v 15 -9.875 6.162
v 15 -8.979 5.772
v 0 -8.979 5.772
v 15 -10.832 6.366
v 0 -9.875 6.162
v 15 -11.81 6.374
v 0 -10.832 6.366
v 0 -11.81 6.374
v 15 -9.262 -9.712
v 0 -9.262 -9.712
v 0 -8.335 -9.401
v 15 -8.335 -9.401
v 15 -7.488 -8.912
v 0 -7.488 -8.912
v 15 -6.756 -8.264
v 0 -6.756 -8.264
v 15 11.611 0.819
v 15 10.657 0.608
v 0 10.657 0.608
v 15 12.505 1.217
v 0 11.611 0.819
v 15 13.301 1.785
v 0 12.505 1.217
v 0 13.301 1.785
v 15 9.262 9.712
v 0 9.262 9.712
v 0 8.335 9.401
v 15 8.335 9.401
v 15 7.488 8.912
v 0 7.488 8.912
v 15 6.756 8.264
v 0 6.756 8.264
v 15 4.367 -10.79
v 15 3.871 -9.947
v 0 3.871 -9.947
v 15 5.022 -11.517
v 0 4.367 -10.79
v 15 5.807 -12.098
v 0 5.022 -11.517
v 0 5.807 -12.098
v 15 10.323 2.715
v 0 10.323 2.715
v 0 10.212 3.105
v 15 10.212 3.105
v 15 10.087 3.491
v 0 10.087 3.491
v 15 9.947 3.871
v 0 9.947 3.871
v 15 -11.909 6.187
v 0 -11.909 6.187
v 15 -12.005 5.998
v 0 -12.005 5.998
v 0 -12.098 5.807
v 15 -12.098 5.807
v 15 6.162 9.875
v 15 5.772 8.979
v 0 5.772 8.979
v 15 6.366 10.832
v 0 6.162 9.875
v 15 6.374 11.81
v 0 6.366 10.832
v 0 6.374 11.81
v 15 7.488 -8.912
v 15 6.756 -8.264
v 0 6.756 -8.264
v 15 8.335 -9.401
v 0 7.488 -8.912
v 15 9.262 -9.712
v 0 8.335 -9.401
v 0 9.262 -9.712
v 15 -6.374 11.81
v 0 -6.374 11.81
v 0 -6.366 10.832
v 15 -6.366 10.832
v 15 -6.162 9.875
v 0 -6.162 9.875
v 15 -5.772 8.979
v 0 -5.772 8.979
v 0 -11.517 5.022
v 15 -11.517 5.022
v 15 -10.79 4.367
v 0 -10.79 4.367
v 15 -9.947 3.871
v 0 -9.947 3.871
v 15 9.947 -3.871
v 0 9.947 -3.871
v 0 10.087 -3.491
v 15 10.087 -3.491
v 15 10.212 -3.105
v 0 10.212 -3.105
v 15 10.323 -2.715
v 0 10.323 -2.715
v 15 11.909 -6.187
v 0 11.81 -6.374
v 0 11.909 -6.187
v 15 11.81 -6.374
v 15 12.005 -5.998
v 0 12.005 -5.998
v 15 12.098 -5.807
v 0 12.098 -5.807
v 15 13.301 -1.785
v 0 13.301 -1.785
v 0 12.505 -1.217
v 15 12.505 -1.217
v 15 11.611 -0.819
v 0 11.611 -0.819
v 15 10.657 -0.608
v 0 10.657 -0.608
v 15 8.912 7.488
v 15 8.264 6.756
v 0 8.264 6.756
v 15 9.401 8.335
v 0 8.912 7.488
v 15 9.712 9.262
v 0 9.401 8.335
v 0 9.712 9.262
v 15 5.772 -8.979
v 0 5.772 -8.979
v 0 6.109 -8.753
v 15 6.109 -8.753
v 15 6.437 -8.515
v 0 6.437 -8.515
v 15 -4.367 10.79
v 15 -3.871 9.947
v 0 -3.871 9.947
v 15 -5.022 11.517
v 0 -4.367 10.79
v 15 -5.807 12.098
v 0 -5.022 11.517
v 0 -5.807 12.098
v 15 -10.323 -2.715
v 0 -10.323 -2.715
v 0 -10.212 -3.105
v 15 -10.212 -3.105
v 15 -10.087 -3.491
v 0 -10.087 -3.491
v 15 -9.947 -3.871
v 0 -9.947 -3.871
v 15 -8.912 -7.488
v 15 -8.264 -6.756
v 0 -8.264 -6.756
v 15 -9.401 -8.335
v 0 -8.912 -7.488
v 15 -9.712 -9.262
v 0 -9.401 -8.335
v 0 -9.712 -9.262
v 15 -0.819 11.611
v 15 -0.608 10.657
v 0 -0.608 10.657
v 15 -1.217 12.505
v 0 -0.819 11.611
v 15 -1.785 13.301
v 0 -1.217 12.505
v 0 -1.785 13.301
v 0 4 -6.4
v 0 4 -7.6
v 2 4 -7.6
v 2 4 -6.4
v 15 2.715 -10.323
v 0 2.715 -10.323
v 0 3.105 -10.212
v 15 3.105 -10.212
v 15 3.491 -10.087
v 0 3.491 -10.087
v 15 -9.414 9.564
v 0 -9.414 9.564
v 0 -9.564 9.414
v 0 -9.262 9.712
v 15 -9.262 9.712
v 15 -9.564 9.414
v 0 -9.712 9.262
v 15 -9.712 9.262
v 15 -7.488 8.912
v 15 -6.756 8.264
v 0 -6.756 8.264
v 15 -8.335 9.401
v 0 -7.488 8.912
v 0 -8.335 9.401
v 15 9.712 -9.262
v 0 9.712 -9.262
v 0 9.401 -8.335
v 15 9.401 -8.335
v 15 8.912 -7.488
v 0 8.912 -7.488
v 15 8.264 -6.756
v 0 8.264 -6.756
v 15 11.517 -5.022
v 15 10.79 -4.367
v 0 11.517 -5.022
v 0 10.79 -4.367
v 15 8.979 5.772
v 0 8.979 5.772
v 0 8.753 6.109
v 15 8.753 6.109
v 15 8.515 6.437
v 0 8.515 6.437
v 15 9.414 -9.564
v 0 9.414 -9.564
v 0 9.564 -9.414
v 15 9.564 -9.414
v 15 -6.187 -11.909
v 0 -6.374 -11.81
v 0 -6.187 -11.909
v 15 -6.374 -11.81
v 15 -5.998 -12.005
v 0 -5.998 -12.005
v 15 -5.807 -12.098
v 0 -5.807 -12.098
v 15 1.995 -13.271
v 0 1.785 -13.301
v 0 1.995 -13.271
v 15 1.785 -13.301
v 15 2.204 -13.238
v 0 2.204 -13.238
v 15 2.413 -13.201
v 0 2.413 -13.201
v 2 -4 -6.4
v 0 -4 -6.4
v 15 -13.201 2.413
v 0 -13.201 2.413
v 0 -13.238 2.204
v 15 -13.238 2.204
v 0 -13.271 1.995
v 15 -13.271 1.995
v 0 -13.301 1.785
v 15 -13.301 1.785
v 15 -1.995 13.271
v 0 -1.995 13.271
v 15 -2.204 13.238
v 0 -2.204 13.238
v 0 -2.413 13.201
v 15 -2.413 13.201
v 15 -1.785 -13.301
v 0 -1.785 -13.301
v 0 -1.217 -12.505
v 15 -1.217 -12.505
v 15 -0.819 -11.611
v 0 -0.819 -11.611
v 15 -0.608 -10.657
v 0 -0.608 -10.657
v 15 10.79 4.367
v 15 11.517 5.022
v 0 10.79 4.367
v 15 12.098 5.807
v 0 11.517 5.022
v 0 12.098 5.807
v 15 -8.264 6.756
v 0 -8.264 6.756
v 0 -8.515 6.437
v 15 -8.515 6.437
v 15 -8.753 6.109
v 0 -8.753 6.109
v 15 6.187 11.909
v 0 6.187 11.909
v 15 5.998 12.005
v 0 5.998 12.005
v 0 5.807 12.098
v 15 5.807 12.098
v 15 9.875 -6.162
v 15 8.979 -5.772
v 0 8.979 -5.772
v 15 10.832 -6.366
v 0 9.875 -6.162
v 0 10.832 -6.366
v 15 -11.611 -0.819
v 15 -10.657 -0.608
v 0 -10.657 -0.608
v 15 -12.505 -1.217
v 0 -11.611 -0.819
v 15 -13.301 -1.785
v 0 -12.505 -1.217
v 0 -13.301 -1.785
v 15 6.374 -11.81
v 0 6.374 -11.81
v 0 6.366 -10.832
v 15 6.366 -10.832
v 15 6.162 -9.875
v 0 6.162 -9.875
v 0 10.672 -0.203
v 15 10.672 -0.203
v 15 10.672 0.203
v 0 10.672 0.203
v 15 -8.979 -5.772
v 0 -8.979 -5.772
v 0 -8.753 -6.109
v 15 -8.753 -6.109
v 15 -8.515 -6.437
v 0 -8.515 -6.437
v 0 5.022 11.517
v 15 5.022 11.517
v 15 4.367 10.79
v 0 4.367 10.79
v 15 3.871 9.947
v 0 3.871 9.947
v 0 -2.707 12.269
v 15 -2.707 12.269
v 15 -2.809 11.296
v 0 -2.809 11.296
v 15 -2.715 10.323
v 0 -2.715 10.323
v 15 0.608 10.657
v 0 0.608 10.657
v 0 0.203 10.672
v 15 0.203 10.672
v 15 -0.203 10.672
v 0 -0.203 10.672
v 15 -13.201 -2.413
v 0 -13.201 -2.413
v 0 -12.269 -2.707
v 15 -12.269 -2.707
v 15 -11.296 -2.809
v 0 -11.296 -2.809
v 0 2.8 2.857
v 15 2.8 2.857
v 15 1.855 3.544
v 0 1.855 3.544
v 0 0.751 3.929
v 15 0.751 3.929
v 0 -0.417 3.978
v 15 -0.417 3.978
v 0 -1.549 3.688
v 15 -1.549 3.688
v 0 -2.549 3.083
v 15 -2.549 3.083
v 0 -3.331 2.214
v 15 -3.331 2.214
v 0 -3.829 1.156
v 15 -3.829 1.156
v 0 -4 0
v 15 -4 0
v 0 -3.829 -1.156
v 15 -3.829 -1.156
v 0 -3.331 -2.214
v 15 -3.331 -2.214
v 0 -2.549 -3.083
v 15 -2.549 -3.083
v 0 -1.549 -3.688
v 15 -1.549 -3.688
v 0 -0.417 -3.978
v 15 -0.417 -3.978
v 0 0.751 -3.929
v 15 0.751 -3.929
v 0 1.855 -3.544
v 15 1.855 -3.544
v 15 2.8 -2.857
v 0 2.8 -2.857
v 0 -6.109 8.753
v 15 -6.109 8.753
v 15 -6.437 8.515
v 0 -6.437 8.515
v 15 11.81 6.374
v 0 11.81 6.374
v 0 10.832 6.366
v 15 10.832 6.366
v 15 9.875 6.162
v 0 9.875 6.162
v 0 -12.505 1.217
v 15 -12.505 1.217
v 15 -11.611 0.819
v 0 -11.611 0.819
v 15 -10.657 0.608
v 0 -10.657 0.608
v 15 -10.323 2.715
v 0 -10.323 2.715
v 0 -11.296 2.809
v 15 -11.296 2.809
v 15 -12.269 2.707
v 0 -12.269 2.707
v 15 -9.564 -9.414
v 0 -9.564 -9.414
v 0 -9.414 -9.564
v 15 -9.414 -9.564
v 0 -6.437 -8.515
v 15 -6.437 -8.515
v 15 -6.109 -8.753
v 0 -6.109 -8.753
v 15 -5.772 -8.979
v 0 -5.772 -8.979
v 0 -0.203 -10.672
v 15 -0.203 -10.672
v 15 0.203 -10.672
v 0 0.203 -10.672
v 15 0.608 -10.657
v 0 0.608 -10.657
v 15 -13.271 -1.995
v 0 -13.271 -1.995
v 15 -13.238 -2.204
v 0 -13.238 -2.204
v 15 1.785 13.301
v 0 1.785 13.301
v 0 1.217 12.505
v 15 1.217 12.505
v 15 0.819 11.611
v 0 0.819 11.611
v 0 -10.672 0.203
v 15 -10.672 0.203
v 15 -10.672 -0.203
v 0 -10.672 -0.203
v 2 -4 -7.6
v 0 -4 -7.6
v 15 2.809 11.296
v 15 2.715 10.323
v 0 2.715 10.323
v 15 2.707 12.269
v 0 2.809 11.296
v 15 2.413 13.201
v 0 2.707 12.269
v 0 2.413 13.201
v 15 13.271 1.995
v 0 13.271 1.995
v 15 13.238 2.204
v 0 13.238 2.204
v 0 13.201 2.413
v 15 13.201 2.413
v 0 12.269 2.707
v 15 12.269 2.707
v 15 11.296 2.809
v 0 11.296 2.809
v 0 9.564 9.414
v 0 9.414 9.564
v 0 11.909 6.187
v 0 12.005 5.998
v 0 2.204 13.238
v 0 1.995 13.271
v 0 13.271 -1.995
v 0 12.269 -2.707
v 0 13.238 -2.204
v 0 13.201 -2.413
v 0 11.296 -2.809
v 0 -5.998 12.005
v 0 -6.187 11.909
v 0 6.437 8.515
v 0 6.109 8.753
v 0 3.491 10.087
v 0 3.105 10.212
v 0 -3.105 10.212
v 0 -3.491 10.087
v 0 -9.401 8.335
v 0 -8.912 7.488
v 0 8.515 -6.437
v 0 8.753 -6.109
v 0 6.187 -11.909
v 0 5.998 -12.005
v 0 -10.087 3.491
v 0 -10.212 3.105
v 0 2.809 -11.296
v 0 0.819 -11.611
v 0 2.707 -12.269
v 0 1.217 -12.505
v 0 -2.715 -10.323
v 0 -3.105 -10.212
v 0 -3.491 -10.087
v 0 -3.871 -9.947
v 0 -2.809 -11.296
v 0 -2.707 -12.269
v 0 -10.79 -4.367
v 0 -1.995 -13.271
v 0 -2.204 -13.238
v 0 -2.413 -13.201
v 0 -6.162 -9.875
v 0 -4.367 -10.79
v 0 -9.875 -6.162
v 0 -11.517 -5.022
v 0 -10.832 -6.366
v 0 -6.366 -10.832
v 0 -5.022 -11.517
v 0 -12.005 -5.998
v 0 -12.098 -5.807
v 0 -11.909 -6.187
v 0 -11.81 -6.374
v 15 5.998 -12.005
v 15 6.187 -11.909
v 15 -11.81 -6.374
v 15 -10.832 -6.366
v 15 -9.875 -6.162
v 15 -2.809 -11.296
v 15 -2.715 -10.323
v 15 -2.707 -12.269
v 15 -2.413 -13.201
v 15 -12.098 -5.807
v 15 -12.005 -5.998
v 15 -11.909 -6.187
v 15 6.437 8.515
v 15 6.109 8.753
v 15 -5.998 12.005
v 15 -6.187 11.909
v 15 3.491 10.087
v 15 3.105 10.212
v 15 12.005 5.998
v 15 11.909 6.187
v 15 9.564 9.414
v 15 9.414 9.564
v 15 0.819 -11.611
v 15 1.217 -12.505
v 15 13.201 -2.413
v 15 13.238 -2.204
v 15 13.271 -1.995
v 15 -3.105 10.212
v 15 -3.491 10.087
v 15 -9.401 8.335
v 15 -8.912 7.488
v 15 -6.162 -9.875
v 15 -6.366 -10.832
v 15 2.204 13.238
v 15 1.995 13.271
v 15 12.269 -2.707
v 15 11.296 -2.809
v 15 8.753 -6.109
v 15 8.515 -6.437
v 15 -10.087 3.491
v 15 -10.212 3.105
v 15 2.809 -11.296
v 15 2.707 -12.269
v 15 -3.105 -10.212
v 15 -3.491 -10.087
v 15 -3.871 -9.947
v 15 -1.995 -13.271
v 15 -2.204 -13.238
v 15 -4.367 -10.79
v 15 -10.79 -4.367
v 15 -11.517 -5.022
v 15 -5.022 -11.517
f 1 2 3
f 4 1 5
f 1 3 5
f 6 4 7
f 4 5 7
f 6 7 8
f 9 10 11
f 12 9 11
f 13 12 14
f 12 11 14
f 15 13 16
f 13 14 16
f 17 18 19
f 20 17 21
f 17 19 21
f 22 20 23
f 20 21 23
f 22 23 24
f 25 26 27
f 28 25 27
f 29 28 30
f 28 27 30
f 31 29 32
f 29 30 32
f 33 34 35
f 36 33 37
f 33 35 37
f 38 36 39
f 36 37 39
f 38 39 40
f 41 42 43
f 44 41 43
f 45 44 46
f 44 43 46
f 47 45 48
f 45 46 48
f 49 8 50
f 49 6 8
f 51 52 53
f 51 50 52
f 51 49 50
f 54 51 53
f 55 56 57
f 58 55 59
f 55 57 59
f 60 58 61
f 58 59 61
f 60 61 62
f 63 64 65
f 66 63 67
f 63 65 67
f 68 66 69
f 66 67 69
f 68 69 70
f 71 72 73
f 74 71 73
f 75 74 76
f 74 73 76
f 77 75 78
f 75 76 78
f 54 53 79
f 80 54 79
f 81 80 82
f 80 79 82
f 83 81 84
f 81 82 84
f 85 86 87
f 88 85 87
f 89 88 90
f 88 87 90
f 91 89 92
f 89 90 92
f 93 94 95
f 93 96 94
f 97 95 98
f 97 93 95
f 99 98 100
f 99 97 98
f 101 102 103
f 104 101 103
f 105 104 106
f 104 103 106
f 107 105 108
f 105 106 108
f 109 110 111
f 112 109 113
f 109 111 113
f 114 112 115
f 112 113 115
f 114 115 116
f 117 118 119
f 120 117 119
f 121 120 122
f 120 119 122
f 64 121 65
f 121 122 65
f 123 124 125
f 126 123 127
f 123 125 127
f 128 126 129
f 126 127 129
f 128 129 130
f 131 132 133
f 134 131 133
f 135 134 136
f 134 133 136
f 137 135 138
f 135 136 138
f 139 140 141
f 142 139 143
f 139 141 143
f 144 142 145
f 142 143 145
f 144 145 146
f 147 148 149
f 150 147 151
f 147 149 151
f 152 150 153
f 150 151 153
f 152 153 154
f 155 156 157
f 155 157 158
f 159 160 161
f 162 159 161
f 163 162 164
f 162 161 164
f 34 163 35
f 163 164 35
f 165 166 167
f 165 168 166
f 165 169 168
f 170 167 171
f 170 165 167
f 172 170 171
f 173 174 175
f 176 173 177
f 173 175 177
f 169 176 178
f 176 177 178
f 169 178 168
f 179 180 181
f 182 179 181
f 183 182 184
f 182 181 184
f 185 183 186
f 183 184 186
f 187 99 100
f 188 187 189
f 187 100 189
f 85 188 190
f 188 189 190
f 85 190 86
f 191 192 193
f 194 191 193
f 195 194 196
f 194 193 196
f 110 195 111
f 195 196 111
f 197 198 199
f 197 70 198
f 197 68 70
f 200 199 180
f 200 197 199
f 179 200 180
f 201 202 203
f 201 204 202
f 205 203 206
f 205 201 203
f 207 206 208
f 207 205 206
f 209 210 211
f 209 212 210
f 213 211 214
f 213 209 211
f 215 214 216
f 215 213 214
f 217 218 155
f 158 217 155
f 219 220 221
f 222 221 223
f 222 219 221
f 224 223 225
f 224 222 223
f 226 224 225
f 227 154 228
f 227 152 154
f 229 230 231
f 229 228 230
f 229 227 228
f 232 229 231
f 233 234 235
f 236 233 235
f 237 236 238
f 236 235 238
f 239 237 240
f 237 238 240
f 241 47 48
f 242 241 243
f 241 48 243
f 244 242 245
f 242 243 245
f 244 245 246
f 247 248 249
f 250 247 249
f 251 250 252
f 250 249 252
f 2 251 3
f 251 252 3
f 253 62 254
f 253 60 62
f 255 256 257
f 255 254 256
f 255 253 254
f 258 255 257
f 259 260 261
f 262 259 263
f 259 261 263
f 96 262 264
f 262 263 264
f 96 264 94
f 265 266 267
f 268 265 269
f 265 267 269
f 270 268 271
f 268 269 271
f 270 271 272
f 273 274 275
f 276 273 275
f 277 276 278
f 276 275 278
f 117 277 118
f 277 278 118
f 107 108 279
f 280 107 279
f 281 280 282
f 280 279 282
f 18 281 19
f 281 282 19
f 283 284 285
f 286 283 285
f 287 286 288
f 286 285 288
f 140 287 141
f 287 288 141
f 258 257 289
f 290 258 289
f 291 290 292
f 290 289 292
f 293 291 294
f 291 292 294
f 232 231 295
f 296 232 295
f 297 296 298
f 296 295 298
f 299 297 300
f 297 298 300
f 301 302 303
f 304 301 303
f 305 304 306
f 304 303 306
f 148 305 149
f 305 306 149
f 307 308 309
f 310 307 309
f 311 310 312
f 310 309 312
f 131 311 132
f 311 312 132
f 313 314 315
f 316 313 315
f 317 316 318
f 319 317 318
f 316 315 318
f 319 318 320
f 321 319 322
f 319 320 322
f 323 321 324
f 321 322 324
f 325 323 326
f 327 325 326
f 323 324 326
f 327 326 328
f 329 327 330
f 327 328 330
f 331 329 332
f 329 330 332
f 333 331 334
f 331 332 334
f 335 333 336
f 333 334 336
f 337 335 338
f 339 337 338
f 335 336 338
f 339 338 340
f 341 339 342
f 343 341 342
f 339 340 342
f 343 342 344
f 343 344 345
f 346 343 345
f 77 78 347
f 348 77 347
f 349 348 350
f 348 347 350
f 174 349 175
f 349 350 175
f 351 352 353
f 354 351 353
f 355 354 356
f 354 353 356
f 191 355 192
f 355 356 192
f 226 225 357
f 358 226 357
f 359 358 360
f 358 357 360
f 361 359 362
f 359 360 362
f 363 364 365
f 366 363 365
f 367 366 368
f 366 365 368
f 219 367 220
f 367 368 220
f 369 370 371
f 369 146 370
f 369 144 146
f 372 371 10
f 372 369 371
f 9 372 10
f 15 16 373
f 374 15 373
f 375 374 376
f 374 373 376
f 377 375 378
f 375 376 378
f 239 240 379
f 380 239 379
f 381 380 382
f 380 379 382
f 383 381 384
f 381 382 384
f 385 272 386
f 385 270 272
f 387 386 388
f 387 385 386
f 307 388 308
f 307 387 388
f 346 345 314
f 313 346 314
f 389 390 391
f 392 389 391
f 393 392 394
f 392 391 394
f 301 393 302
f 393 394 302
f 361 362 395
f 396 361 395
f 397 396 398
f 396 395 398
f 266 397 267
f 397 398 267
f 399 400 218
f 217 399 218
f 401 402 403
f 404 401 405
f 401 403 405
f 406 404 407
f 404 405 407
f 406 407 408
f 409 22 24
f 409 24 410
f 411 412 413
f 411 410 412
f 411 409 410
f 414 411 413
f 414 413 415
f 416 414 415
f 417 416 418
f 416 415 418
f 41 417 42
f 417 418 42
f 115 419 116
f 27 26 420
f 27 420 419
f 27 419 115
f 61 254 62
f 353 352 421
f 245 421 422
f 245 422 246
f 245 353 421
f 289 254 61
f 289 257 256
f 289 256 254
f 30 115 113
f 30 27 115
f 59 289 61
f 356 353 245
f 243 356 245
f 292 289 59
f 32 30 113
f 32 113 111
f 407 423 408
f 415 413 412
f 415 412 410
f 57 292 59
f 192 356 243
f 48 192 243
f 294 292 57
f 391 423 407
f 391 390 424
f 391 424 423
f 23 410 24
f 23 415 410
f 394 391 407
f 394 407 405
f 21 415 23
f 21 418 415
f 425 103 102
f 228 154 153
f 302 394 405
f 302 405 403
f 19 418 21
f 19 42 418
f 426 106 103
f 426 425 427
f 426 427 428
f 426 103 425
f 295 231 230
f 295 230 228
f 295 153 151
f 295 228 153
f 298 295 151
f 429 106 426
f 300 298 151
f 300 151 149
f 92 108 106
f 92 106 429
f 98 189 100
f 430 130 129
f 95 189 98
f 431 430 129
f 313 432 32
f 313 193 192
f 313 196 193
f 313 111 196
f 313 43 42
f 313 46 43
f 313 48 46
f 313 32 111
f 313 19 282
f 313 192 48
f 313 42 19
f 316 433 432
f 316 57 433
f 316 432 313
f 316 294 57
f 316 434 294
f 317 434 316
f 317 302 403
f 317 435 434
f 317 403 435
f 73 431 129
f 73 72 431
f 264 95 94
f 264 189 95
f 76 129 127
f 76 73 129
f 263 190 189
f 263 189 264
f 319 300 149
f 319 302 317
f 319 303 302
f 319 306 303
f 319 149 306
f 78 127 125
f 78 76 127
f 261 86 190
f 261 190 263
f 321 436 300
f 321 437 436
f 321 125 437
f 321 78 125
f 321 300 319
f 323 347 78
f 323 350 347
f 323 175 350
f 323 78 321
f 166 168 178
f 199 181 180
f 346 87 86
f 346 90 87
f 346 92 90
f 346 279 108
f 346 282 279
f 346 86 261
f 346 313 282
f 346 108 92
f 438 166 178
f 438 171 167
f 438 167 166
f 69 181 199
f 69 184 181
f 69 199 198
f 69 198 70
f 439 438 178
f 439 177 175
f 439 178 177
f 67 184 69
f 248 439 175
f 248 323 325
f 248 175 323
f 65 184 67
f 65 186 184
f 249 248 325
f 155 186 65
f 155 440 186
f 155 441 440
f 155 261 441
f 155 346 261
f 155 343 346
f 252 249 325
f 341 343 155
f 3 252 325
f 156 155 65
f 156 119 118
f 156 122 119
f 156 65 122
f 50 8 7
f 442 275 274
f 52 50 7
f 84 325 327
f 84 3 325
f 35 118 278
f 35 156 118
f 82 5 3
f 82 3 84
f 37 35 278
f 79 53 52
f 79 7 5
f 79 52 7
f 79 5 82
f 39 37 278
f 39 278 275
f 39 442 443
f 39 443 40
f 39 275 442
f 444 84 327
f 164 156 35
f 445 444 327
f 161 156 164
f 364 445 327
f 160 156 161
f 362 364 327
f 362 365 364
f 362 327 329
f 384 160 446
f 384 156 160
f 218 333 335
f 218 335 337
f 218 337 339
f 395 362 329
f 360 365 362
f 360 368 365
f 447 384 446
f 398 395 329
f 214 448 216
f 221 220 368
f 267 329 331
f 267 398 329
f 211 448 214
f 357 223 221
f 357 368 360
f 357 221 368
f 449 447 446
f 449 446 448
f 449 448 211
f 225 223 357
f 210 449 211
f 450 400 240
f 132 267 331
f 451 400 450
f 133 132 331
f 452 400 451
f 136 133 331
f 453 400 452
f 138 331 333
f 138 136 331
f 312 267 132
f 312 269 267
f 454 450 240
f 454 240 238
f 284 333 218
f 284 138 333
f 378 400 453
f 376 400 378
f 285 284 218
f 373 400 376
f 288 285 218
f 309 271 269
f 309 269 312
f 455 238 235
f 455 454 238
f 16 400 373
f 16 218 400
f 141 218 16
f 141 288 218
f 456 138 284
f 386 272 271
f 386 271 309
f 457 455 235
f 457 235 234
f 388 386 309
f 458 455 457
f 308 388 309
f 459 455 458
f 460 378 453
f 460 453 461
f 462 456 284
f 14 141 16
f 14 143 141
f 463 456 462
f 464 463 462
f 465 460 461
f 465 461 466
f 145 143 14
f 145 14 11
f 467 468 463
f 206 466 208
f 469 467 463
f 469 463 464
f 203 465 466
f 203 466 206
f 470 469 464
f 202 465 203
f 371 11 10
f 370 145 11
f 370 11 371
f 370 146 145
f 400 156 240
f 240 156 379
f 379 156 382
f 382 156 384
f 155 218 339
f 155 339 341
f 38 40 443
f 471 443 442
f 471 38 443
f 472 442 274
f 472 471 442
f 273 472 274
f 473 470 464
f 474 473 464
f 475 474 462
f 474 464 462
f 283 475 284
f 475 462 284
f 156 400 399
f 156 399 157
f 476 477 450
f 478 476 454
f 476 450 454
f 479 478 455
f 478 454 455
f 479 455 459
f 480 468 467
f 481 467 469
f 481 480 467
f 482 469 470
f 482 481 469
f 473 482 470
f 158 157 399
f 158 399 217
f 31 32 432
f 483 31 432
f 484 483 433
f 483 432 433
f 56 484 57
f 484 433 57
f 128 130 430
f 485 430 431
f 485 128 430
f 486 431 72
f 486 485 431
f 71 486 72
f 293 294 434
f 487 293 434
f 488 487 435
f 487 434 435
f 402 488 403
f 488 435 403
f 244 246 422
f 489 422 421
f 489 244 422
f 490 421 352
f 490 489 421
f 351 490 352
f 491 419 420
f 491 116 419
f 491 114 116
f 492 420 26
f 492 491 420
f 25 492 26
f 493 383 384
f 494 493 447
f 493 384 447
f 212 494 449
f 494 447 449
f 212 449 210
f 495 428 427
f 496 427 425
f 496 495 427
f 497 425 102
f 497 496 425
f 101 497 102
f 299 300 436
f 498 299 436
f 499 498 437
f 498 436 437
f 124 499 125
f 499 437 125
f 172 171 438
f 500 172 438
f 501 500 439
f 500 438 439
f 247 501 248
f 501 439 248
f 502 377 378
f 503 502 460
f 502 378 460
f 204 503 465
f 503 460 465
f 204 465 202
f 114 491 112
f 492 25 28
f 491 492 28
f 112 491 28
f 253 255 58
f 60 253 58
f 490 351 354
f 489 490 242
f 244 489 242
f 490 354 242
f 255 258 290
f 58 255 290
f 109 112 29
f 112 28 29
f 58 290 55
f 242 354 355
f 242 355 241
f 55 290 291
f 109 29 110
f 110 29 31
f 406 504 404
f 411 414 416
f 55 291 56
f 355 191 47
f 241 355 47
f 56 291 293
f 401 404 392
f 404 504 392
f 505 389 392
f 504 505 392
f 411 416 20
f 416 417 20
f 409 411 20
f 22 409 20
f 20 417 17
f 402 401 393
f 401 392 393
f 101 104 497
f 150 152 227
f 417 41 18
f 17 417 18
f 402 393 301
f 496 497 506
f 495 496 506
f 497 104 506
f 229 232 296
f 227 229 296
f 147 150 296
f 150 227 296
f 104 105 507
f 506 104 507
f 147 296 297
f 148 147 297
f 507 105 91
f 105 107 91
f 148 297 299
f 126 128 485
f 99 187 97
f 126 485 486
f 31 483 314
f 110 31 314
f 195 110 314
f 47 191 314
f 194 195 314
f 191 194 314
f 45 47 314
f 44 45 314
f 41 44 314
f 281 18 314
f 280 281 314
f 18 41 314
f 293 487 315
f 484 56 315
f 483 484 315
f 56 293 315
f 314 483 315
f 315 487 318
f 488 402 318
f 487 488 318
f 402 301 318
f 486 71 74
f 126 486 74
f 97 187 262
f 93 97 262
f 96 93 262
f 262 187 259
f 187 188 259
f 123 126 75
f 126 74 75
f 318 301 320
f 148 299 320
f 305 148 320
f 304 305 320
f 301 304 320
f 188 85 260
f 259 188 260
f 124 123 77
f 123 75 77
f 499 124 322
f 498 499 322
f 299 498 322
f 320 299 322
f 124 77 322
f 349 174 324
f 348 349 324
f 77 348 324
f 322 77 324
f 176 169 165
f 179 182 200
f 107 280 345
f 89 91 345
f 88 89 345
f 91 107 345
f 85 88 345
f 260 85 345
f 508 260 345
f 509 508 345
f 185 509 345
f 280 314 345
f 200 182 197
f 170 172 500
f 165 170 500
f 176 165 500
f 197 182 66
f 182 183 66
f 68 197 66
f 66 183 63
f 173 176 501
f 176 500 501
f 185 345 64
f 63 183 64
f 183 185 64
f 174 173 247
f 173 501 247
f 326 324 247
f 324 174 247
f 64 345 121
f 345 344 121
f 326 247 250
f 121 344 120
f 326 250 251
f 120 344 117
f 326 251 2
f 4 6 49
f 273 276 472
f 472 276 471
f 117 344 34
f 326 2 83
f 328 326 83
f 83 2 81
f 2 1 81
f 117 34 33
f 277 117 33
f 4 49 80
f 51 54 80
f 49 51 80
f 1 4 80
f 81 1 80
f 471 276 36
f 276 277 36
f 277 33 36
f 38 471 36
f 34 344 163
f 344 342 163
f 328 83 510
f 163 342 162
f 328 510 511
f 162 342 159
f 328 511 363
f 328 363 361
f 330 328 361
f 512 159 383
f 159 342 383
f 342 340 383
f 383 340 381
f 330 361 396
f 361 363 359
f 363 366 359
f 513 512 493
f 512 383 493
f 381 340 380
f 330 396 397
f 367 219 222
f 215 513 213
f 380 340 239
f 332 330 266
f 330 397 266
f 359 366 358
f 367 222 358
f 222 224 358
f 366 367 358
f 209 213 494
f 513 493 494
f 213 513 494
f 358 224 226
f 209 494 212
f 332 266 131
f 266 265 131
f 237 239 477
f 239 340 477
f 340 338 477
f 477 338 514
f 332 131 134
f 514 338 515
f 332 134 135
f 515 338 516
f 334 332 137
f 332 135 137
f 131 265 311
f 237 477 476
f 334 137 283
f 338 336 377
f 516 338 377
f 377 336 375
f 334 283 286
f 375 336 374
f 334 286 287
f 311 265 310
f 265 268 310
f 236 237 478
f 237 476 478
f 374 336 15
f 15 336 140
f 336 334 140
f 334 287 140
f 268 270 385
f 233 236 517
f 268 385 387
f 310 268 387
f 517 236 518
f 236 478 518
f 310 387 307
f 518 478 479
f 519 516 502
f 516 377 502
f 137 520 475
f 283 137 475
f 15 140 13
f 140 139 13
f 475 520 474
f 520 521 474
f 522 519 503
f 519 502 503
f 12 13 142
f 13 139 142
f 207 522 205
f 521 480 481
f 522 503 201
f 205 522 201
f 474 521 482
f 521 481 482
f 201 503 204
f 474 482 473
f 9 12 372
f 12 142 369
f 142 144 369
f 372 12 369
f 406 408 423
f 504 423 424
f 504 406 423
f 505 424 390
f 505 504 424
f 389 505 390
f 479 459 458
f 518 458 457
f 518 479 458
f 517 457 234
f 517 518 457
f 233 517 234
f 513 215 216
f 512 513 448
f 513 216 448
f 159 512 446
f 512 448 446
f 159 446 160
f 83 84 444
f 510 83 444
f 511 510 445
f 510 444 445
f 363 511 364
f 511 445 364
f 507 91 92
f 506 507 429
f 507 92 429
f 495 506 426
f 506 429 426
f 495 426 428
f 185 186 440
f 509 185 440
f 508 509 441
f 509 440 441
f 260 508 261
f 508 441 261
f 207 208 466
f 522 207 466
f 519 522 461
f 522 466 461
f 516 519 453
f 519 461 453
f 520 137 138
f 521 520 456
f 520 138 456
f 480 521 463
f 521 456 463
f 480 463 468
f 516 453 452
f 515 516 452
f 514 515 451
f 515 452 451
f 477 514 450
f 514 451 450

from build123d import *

# Parameters (mm, degrees)
BASPROSKE_W         = 15
BASPROSKE_H         = 13.42
TOOTHCUT_DEPTH      = 25.190758566
TEETHCUTS_COUNT     = 20
TEETHCUTS_ANGLE     = 342
BORSKE_R            = 4
BORE_DEPTH          = 50.0000508
BOSS_EXTRUDE1_START = -15
BOSS_EXTRUDE1_DEPTH = 15
SKETCH2_W           = 1.2
SKETCH2_H           = 8
CUT_EXTRUDE1_DEPTH  = 2


with BuildPart() as part:
    # BasProSke → Base-Revolve (revolve)
    with BuildSketch(Plane(origin=(0, 0, 0), x_dir=(1, 0, 0), z_dir=(0, 1, 0)), mode=Mode.PRIVATE) as base_revolve_sk:
        with Locations((7.5, 6.71)):
            Rectangle(BASPROSKE_W, BASPROSKE_H)
    revolve(base_revolve_sk.sketch.rotate(Axis((-10, 0, 0), (1, 0, 0)), 180), axis=Axis((-10, 0, 0), (1, 0, 0)))

    # TooCutSke → ToothCut (cut, through all)
    with BuildSketch(Plane(origin=(0, 0, 0), x_dir=(0, 0, -1), z_dir=(1, 0, 0))):
        with BuildLine():
            ThreePointArc((0.607848894, 10.656678456), (0, 10.674), (-0.607848894, 10.656678456))
            ThreePointArc((-0.607848894, 10.656678456), (-1.001950595, 12.081933102), (-1.804853959, 13.32371132))
            ThreePointArc((-1.804853959, 13.32371132), (0, 13.4454), (1.804853959, 13.32371132))
            ThreePointArc((1.804853959, 13.32371132), (1.001950595, 12.081933102), (0.607848894, 10.656678456))
        make_face()
    toothcut = extrude(amount=TOOTHCUT_DEPTH, mode=Mode.SUBTRACT)

    # TeethCuts: ToothCut ×20 about axis
    teethcuts_axis = Axis((-10, 0, 0), (1, 0, 0))
    for i in range(1, TEETHCUTS_COUNT):
        add(toothcut.rotate(teethcuts_axis, i * TEETHCUTS_ANGLE / (TEETHCUTS_COUNT - 1)), mode=Mode.SUBTRACT)

    # BorSke → Bore (cut, symmetric)
    with BuildSketch(Plane(origin=(0, 0, 0), x_dir=(0, 0, -1), z_dir=(1, 0, 0))):
        with Locations(Location((0, 0, 0), (0, 0, 180))):
            Circle(BORSKE_R)
    extrude(amount=BORE_DEPTH, both=True, mode=Mode.SUBTRACT)

    # Sketch1 → Boss-Extrude1 (add)
    with BuildSketch(Plane.ZY.offset(BOSS_EXTRUDE1_START)):
        with BuildLine():
            Line((-2.856571371, 2.8), (2.856571371, 2.8))
            ThreePointArc((2.856571371, 2.8), (0, 4), (-2.856571371, 2.8))
        make_face()
    extrude(amount=BOSS_EXTRUDE1_DEPTH)

    # Sketch2 → Cut-Extrude1 (cut)
    with BuildSketch(Plane.ZY):
        with Locations((-7, 0)):
            Rectangle(SKETCH2_W, SKETCH2_H)
    extrude(amount=-CUT_EXTRUDE1_DEPTH, mode=Mode.SUBTRACT)


solid = part.part
